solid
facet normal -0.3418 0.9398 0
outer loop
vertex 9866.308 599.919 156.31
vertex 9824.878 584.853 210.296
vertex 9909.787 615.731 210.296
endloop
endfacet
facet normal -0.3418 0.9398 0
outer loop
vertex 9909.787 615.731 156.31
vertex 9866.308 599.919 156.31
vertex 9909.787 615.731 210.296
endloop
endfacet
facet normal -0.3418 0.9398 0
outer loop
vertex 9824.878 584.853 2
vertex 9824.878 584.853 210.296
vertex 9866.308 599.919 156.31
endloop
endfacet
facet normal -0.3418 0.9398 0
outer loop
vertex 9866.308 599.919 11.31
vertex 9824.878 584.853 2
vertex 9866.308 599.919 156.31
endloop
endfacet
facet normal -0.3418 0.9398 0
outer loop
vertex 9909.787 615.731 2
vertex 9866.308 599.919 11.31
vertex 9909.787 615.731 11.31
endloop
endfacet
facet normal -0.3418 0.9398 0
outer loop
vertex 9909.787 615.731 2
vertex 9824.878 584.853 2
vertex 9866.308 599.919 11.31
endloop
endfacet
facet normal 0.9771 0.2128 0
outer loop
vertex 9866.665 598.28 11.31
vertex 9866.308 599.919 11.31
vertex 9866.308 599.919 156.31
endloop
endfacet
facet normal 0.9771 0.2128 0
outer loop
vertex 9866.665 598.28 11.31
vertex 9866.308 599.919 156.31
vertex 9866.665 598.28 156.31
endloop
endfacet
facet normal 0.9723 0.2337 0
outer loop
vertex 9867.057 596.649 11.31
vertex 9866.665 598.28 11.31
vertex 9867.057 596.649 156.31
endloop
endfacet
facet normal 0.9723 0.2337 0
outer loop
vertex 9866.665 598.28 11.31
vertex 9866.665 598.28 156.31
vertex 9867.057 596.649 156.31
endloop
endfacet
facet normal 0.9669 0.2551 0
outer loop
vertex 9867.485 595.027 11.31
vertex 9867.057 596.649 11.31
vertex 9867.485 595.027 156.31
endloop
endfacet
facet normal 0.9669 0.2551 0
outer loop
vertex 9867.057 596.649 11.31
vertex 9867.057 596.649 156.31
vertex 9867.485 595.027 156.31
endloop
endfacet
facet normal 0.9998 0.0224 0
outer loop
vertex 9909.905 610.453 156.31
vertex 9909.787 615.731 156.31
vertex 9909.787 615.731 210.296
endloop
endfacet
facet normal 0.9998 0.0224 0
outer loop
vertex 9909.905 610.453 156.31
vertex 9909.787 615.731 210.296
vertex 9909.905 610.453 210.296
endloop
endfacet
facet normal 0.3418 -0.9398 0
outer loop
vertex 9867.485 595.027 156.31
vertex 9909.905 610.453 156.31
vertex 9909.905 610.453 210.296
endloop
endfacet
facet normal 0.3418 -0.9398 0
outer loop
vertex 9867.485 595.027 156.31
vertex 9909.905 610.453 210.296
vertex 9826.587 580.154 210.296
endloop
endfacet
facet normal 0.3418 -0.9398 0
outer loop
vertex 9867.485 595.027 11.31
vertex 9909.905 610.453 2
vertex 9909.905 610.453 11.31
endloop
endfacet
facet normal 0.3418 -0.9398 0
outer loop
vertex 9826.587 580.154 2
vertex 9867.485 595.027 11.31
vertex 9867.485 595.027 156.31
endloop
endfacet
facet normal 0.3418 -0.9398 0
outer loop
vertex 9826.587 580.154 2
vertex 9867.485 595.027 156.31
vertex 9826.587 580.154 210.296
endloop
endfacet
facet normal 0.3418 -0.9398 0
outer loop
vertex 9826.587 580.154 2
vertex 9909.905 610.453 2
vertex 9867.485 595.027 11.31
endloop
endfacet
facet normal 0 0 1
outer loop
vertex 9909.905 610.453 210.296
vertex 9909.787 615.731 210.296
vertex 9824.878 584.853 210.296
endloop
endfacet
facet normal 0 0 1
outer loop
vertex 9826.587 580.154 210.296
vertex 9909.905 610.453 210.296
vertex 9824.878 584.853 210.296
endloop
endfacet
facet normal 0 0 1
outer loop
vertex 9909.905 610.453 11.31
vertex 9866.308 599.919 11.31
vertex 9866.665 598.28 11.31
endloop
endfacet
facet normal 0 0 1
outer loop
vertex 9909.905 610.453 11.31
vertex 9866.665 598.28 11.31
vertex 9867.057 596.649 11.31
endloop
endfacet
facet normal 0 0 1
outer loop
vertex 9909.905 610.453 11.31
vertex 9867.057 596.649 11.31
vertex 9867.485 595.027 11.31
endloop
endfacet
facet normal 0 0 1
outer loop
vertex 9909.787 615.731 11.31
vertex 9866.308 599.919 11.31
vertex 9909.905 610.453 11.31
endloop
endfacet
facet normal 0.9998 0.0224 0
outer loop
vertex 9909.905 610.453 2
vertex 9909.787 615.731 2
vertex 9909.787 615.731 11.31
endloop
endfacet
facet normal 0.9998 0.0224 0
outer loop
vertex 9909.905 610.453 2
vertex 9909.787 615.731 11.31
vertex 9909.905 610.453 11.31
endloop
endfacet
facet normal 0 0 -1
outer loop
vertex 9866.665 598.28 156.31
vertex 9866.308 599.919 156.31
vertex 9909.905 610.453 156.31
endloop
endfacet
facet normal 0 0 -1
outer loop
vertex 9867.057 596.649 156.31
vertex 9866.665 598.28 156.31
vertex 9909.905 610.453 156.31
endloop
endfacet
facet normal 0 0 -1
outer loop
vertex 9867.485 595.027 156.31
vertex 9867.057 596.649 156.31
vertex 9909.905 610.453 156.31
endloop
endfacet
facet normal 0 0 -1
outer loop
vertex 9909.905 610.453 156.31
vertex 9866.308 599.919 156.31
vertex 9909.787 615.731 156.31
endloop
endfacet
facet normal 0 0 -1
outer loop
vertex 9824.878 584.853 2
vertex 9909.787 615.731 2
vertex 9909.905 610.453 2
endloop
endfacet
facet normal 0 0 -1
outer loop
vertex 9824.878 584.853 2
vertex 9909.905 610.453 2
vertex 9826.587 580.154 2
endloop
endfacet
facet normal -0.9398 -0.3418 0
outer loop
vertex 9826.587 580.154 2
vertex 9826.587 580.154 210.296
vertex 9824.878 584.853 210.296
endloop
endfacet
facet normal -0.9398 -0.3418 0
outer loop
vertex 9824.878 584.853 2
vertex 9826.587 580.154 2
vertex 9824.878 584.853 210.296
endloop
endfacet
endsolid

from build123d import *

# Parameters (mm, degrees)
BOSS_EXTRUDE1_DEPTH = 208.295833
SKETCH3_R           = 77.5
CUT_EXTRUDE1_DEPTH  = 145


with BuildPart() as part:
    # Sketch2 → Boss-Extrude1 (new body)
    with BuildSketch(Plane.XY.offset(2)):
        Polygon((9824.878184452, 584.852821259), (9909.787083093, 615.730562922), (9909.905272796, 610.453189538), (9826.586986697, 580.153885753), align=None)
    extrude(amount=BOSS_EXTRUDE1_DEPTH)

    # Sketch3 → Cut-Extrude1 (cut)
    with BuildSketch(Plane.XY.offset(156.31)):
        with Locations((9942.206448064, 615.592583884)):
            Circle(SKETCH3_R)
    extrude(amount=-CUT_EXTRUDE1_DEPTH, mode=Mode.SUBTRACT)


solid = part.part
